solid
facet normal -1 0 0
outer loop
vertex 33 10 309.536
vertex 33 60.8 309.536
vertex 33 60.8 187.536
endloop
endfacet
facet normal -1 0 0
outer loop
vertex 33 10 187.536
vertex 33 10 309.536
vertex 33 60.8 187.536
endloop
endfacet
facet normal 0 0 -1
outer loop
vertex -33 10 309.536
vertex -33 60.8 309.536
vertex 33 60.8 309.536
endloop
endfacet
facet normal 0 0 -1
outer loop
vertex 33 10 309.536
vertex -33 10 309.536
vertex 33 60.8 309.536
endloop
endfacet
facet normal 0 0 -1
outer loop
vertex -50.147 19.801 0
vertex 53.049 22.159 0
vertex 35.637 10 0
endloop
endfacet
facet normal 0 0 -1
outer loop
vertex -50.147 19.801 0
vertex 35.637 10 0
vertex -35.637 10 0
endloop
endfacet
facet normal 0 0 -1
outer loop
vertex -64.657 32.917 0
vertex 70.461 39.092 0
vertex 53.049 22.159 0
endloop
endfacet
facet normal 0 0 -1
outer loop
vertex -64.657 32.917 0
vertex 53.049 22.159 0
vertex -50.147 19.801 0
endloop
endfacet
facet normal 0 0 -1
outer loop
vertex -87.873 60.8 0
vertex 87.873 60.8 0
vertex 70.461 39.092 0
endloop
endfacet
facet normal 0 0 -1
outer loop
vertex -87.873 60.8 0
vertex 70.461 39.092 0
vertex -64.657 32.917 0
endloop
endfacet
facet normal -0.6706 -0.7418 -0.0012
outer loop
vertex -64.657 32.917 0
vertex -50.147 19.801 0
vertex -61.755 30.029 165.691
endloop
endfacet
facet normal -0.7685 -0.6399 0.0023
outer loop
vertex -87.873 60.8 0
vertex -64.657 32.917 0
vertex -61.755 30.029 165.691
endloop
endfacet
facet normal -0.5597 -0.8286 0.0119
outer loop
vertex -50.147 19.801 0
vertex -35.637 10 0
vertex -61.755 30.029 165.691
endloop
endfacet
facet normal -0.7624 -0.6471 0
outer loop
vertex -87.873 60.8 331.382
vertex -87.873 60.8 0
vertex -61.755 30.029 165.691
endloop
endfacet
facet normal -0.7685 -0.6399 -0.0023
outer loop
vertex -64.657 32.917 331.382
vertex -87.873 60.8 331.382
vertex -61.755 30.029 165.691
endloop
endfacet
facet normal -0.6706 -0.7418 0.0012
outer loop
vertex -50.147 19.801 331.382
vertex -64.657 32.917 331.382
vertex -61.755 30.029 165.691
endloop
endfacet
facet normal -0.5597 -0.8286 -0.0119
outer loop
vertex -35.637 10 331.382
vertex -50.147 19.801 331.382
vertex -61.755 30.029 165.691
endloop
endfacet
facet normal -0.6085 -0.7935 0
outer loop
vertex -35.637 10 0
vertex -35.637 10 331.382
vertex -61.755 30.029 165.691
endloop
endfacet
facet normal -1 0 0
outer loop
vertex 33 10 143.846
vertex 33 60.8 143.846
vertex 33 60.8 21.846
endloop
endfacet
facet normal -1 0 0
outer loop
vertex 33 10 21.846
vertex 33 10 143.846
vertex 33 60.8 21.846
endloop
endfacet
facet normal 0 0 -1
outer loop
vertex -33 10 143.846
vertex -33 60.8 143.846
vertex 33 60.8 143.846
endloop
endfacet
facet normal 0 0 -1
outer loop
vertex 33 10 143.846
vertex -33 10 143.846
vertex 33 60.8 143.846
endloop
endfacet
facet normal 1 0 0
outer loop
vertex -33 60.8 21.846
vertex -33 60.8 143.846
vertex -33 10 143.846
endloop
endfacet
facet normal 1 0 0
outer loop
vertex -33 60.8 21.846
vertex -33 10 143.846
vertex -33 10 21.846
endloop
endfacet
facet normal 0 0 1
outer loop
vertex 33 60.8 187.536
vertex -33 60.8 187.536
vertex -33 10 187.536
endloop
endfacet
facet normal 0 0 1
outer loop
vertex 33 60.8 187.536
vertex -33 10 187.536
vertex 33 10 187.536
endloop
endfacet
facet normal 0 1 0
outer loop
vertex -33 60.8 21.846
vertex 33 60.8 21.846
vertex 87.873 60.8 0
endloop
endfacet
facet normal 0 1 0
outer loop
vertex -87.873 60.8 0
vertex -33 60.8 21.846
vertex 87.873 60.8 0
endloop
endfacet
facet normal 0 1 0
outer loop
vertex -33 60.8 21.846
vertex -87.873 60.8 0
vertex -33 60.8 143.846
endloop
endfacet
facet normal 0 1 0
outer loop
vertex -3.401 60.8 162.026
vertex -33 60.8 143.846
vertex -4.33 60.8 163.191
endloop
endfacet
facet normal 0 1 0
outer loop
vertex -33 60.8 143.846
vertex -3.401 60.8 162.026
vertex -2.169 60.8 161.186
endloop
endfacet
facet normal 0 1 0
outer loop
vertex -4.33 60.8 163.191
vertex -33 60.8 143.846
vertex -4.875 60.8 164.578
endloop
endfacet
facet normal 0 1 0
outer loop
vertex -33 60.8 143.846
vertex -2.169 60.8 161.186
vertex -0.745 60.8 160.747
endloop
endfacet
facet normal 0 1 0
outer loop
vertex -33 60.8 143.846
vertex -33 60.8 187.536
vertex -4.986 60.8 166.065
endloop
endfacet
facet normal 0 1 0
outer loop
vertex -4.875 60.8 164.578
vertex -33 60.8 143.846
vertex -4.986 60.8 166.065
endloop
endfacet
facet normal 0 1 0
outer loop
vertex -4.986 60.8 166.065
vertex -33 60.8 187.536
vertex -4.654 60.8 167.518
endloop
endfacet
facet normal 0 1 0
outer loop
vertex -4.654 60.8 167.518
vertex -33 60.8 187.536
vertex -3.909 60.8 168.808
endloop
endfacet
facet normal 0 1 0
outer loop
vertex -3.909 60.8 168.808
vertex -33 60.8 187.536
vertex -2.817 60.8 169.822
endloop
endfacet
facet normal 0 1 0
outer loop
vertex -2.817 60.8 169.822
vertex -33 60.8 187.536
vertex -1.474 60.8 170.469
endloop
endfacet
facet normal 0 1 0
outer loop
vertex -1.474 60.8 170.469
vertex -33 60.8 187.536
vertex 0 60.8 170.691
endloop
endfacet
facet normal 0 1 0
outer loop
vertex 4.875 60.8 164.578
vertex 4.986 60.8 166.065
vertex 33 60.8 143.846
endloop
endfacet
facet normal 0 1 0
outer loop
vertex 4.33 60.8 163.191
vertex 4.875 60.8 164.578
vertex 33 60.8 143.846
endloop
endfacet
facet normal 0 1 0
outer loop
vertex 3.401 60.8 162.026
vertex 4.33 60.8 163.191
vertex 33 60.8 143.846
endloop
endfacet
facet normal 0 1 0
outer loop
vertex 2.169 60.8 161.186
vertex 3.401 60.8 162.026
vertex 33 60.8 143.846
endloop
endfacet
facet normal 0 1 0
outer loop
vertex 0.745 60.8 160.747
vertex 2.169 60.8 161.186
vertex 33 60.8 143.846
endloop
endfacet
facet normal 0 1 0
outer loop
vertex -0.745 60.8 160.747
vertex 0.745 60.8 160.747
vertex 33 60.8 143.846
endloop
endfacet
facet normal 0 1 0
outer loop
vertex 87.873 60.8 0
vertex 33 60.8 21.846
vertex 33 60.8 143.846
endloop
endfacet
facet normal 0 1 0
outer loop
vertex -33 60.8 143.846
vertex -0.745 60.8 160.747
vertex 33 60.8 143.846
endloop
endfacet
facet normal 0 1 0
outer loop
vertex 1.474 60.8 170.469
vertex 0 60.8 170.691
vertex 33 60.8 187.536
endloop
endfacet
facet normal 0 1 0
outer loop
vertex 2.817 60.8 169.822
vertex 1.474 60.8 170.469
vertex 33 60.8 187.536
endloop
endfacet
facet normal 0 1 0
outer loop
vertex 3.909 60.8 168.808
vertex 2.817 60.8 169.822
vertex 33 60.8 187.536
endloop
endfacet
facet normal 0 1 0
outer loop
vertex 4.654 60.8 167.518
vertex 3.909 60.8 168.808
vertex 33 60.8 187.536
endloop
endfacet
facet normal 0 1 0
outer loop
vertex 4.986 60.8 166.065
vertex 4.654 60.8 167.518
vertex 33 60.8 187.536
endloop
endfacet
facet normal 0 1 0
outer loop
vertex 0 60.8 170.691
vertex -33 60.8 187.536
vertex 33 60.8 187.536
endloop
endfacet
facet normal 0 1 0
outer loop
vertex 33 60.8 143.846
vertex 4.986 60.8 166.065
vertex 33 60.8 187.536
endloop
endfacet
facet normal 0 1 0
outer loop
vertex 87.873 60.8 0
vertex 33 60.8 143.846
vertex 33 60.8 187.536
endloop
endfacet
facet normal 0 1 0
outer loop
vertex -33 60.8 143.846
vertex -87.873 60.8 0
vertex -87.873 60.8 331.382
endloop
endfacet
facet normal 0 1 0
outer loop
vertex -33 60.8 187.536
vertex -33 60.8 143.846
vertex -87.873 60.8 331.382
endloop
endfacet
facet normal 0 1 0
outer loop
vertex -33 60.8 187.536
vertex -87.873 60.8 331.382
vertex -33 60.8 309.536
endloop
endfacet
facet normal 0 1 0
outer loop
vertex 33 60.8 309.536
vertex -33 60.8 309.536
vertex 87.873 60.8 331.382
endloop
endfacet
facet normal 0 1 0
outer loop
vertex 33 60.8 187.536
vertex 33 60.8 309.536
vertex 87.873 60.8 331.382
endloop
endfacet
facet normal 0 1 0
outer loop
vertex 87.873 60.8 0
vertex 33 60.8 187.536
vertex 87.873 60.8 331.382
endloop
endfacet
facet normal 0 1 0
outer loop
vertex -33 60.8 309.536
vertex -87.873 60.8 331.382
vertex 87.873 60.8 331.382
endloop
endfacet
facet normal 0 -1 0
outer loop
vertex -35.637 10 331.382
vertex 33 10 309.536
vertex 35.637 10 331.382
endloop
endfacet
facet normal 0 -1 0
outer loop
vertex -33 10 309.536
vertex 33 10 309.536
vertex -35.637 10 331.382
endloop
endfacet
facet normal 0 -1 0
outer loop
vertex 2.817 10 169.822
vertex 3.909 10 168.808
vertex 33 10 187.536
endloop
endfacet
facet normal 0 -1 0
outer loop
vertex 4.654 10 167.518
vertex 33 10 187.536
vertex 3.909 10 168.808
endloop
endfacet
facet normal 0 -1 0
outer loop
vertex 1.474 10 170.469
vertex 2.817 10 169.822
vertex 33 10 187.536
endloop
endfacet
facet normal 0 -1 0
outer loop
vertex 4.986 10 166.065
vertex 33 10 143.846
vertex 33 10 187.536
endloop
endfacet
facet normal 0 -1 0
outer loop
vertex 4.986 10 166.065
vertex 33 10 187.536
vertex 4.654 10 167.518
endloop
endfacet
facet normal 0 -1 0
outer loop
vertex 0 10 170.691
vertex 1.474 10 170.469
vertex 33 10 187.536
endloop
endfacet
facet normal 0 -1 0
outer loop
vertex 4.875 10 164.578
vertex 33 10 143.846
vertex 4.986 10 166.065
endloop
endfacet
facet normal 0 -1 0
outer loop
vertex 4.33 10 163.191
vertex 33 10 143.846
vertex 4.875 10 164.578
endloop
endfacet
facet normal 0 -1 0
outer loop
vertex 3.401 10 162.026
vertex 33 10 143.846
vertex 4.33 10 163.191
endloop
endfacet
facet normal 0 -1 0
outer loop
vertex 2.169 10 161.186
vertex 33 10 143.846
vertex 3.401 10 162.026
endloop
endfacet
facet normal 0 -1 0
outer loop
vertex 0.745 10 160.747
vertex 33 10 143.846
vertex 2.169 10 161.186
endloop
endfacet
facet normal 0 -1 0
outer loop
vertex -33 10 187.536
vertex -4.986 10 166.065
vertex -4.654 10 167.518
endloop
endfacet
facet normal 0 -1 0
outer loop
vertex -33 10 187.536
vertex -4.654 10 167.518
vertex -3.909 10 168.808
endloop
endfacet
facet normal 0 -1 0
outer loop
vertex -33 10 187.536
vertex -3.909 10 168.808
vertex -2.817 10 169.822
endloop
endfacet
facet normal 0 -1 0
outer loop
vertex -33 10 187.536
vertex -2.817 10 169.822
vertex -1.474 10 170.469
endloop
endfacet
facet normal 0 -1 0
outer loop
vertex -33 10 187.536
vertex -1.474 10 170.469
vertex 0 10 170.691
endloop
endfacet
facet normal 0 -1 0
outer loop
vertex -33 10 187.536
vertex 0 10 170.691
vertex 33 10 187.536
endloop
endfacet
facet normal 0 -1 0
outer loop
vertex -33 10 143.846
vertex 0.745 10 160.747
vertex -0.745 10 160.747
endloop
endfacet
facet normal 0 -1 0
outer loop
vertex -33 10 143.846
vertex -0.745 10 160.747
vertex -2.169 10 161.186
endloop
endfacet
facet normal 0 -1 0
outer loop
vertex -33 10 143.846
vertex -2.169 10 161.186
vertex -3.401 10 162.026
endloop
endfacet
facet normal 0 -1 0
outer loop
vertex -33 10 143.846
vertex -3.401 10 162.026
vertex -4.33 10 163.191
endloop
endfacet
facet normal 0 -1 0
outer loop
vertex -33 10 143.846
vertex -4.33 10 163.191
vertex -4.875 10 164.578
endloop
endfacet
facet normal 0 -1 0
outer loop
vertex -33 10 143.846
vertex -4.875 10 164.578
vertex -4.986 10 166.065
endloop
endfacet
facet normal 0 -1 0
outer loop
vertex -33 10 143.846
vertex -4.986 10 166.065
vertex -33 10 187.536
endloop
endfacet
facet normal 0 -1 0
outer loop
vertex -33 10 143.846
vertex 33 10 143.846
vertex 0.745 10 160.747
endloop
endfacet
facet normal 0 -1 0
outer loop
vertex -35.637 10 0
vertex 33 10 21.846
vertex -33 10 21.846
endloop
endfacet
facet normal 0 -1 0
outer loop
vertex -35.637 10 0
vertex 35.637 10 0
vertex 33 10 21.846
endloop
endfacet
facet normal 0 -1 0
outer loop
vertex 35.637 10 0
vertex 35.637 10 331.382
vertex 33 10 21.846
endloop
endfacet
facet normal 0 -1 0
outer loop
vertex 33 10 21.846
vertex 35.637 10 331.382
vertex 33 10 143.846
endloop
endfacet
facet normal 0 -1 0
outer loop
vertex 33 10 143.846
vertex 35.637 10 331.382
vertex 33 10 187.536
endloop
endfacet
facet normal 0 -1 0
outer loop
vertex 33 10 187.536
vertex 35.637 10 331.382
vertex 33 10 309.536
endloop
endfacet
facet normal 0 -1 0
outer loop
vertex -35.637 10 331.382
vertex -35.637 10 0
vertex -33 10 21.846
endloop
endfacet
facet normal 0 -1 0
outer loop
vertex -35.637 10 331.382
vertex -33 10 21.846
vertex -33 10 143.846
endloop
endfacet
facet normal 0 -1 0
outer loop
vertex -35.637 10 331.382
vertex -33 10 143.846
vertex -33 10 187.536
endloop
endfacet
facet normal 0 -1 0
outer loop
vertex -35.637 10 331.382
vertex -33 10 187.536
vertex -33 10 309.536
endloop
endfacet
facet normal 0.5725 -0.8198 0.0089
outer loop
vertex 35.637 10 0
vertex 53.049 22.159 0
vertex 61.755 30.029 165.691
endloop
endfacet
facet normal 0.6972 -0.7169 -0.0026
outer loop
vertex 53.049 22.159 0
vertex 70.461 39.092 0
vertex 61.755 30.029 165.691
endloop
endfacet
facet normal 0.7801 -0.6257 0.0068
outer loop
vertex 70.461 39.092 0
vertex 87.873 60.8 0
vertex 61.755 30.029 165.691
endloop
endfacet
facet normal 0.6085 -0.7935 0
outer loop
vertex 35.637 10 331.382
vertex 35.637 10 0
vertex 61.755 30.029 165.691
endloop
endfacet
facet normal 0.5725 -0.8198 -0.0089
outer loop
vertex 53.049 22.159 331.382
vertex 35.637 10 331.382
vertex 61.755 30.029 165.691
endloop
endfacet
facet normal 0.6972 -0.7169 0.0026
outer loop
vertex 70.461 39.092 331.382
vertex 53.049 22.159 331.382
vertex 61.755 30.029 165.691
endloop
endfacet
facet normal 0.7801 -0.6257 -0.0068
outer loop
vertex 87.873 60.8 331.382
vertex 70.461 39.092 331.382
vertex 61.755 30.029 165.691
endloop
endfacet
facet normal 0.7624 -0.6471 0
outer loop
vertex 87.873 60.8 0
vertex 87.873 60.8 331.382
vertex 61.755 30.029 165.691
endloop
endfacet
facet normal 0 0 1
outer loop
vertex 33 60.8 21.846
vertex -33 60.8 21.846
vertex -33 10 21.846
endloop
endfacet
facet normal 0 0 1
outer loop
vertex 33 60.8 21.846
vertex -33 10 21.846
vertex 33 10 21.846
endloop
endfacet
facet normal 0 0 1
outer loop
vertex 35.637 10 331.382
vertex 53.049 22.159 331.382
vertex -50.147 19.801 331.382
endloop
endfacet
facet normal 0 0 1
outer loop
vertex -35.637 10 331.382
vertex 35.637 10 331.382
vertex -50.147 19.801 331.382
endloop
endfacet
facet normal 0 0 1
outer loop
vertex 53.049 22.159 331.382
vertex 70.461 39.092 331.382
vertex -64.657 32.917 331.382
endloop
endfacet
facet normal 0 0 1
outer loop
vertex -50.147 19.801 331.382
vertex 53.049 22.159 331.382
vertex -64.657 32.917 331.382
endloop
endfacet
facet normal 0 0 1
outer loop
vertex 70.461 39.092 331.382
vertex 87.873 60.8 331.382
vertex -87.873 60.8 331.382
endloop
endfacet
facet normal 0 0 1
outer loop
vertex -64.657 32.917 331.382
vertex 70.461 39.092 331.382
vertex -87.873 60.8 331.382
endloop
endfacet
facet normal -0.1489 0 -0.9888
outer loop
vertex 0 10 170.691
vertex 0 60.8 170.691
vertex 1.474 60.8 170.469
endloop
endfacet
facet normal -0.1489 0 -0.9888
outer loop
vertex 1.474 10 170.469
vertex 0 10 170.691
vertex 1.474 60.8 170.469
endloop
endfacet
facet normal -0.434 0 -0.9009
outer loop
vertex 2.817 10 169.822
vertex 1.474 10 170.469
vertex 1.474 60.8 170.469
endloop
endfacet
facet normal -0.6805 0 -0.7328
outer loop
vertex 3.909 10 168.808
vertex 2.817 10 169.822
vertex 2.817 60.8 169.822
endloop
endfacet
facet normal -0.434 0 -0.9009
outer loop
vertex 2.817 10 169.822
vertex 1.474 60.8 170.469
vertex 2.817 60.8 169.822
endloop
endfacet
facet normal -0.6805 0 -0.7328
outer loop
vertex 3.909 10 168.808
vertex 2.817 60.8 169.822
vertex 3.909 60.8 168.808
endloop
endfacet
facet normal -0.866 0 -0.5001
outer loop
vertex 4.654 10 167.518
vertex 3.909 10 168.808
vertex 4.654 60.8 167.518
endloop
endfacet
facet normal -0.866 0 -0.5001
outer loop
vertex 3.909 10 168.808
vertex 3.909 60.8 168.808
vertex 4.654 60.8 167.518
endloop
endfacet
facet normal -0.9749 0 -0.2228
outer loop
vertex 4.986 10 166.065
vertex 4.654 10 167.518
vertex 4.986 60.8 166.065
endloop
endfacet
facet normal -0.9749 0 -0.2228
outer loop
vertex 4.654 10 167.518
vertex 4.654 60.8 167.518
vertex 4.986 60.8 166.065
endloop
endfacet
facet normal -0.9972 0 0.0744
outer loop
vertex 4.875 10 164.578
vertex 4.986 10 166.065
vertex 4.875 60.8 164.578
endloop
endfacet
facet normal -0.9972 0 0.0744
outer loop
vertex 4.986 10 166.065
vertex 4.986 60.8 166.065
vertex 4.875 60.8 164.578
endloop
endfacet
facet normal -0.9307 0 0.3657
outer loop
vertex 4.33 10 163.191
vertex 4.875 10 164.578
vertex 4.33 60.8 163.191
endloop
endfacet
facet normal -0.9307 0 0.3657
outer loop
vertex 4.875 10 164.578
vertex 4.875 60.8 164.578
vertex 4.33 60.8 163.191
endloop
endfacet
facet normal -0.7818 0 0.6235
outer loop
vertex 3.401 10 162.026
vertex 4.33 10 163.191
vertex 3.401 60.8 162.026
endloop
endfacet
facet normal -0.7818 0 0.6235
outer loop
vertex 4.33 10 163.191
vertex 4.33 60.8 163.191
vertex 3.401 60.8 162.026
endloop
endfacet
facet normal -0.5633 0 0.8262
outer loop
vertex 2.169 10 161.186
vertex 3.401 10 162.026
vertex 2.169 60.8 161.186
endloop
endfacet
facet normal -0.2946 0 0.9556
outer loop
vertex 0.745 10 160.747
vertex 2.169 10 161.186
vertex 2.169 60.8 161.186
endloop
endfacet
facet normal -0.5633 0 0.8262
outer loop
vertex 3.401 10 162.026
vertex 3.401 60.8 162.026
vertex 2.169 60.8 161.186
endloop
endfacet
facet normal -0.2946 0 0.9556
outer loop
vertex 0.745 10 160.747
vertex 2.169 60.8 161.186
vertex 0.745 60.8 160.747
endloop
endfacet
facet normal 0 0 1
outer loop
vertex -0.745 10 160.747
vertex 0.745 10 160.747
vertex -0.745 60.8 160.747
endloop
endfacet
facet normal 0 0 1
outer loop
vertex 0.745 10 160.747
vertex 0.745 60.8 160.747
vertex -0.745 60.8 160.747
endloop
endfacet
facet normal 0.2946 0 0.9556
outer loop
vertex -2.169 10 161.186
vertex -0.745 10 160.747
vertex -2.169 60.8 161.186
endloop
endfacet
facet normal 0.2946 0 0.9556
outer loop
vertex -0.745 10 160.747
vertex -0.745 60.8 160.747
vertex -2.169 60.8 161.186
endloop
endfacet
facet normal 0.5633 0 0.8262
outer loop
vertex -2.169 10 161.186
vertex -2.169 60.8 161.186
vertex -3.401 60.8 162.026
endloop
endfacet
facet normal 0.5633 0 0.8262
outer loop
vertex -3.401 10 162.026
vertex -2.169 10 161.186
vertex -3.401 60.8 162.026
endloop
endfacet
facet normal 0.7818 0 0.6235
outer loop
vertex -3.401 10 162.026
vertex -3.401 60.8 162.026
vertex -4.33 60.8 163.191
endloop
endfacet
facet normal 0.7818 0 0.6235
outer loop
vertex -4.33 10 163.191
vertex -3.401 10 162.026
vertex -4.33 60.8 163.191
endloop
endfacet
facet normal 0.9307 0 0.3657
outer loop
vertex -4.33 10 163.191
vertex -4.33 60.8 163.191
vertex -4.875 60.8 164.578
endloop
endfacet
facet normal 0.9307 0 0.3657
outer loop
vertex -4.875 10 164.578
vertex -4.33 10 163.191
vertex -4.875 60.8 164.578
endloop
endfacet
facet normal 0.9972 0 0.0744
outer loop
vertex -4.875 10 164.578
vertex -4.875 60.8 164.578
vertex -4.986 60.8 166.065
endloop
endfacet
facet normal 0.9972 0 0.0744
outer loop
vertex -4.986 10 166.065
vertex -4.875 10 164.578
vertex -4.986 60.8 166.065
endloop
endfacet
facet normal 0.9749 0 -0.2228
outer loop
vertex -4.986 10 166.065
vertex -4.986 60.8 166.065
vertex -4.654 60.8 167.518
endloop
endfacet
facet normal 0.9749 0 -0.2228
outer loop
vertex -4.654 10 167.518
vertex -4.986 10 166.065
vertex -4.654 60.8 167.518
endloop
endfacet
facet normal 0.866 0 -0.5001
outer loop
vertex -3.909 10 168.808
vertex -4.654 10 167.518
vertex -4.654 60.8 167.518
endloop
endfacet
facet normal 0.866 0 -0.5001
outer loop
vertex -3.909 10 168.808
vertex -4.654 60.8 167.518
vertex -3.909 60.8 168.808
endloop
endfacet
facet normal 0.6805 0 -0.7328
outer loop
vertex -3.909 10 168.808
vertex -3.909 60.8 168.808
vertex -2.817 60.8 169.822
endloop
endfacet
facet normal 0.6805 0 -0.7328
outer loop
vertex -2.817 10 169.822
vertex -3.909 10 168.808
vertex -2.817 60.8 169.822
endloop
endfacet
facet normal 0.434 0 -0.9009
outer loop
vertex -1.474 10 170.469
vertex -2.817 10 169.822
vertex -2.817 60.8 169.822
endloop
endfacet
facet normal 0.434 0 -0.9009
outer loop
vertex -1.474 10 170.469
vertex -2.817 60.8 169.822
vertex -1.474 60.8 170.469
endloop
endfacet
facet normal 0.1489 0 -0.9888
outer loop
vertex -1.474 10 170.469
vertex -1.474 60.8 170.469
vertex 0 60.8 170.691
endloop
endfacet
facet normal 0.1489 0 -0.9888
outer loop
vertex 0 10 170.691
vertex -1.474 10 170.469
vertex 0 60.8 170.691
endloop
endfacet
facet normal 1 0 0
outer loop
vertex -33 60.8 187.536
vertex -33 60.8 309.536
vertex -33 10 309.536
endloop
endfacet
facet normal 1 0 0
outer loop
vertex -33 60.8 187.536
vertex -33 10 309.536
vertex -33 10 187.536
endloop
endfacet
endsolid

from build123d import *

# Parameters (mm, degrees)
BOSS_EXTRUDE2_DEPTH = 331.382
SKETCH3_R           = 5
SKETCH3_W           = 66
SKETCH3_H           = 122
CUT_EXTRUDE2_DEPTH  = 377.924435453
SKETCH4_W           = 80
SKETCH4_H           = 10
CUT_EXTRUDE3_DEPTH  = 377.924435453
SKETCH5_W           = 260
SKETCH5_H           = 70
CUT_EXTRUDE4_DEPTH  = 377.924435453


with BuildPart() as part:
    # Sketch2 → Boss-Extrude2 (new body)
    with BuildSketch(Plane.XY):
        with BuildLine():
            Line((-127, 127), (127, 127))
            add(Edge.make_bspline(
                [(-127, 127), (0, -127), (127, 127)],
                knots=[0.056028396, 0.056028396, 0.056028396, 0.943971604, 0.943971604, 0.943971604], degree=2))
        make_face()
    extrude(amount=BOSS_EXTRUDE2_DEPTH)

    # Sketch3 → Cut-Extrude2 (cut, through all)
    with BuildSketch(Plane(origin=(0, 127, 0), x_dir=(1, 0, 0), z_dir=(0, 1, 0))):
        with Locations(Location((0, -165.691, 0), (0, 0, 270))):
            Circle(SKETCH3_R)
        with Locations((0, -82.8455)):
            Rectangle(SKETCH3_W, SKETCH3_H)
        with Locations((0, -248.5365)):
            Rectangle(SKETCH3_W, SKETCH3_H)
    extrude(amount=-CUT_EXTRUDE2_DEPTH, mode=Mode.SUBTRACT)

    # Sketch4 → Cut-Extrude3 (cut, through all)
    with BuildSketch(Plane(origin=(0, 0, 0), x_dir=(-1, 0, 0), z_dir=(0, 0, -1))):
        with Locations((0, 5)):
            Rectangle(SKETCH4_W, SKETCH4_H)
    extrude(amount=-CUT_EXTRUDE3_DEPTH, mode=Mode.SUBTRACT)

    # Sketch5 → Cut-Extrude4 (cut, through all)
    with BuildSketch(Plane.XY.offset(331.382)):
        with Locations((0, 95.8)):
            Rectangle(SKETCH5_W, SKETCH5_H)
    extrude(amount=-CUT_EXTRUDE4_DEPTH, mode=Mode.SUBTRACT)


solid = part.part
